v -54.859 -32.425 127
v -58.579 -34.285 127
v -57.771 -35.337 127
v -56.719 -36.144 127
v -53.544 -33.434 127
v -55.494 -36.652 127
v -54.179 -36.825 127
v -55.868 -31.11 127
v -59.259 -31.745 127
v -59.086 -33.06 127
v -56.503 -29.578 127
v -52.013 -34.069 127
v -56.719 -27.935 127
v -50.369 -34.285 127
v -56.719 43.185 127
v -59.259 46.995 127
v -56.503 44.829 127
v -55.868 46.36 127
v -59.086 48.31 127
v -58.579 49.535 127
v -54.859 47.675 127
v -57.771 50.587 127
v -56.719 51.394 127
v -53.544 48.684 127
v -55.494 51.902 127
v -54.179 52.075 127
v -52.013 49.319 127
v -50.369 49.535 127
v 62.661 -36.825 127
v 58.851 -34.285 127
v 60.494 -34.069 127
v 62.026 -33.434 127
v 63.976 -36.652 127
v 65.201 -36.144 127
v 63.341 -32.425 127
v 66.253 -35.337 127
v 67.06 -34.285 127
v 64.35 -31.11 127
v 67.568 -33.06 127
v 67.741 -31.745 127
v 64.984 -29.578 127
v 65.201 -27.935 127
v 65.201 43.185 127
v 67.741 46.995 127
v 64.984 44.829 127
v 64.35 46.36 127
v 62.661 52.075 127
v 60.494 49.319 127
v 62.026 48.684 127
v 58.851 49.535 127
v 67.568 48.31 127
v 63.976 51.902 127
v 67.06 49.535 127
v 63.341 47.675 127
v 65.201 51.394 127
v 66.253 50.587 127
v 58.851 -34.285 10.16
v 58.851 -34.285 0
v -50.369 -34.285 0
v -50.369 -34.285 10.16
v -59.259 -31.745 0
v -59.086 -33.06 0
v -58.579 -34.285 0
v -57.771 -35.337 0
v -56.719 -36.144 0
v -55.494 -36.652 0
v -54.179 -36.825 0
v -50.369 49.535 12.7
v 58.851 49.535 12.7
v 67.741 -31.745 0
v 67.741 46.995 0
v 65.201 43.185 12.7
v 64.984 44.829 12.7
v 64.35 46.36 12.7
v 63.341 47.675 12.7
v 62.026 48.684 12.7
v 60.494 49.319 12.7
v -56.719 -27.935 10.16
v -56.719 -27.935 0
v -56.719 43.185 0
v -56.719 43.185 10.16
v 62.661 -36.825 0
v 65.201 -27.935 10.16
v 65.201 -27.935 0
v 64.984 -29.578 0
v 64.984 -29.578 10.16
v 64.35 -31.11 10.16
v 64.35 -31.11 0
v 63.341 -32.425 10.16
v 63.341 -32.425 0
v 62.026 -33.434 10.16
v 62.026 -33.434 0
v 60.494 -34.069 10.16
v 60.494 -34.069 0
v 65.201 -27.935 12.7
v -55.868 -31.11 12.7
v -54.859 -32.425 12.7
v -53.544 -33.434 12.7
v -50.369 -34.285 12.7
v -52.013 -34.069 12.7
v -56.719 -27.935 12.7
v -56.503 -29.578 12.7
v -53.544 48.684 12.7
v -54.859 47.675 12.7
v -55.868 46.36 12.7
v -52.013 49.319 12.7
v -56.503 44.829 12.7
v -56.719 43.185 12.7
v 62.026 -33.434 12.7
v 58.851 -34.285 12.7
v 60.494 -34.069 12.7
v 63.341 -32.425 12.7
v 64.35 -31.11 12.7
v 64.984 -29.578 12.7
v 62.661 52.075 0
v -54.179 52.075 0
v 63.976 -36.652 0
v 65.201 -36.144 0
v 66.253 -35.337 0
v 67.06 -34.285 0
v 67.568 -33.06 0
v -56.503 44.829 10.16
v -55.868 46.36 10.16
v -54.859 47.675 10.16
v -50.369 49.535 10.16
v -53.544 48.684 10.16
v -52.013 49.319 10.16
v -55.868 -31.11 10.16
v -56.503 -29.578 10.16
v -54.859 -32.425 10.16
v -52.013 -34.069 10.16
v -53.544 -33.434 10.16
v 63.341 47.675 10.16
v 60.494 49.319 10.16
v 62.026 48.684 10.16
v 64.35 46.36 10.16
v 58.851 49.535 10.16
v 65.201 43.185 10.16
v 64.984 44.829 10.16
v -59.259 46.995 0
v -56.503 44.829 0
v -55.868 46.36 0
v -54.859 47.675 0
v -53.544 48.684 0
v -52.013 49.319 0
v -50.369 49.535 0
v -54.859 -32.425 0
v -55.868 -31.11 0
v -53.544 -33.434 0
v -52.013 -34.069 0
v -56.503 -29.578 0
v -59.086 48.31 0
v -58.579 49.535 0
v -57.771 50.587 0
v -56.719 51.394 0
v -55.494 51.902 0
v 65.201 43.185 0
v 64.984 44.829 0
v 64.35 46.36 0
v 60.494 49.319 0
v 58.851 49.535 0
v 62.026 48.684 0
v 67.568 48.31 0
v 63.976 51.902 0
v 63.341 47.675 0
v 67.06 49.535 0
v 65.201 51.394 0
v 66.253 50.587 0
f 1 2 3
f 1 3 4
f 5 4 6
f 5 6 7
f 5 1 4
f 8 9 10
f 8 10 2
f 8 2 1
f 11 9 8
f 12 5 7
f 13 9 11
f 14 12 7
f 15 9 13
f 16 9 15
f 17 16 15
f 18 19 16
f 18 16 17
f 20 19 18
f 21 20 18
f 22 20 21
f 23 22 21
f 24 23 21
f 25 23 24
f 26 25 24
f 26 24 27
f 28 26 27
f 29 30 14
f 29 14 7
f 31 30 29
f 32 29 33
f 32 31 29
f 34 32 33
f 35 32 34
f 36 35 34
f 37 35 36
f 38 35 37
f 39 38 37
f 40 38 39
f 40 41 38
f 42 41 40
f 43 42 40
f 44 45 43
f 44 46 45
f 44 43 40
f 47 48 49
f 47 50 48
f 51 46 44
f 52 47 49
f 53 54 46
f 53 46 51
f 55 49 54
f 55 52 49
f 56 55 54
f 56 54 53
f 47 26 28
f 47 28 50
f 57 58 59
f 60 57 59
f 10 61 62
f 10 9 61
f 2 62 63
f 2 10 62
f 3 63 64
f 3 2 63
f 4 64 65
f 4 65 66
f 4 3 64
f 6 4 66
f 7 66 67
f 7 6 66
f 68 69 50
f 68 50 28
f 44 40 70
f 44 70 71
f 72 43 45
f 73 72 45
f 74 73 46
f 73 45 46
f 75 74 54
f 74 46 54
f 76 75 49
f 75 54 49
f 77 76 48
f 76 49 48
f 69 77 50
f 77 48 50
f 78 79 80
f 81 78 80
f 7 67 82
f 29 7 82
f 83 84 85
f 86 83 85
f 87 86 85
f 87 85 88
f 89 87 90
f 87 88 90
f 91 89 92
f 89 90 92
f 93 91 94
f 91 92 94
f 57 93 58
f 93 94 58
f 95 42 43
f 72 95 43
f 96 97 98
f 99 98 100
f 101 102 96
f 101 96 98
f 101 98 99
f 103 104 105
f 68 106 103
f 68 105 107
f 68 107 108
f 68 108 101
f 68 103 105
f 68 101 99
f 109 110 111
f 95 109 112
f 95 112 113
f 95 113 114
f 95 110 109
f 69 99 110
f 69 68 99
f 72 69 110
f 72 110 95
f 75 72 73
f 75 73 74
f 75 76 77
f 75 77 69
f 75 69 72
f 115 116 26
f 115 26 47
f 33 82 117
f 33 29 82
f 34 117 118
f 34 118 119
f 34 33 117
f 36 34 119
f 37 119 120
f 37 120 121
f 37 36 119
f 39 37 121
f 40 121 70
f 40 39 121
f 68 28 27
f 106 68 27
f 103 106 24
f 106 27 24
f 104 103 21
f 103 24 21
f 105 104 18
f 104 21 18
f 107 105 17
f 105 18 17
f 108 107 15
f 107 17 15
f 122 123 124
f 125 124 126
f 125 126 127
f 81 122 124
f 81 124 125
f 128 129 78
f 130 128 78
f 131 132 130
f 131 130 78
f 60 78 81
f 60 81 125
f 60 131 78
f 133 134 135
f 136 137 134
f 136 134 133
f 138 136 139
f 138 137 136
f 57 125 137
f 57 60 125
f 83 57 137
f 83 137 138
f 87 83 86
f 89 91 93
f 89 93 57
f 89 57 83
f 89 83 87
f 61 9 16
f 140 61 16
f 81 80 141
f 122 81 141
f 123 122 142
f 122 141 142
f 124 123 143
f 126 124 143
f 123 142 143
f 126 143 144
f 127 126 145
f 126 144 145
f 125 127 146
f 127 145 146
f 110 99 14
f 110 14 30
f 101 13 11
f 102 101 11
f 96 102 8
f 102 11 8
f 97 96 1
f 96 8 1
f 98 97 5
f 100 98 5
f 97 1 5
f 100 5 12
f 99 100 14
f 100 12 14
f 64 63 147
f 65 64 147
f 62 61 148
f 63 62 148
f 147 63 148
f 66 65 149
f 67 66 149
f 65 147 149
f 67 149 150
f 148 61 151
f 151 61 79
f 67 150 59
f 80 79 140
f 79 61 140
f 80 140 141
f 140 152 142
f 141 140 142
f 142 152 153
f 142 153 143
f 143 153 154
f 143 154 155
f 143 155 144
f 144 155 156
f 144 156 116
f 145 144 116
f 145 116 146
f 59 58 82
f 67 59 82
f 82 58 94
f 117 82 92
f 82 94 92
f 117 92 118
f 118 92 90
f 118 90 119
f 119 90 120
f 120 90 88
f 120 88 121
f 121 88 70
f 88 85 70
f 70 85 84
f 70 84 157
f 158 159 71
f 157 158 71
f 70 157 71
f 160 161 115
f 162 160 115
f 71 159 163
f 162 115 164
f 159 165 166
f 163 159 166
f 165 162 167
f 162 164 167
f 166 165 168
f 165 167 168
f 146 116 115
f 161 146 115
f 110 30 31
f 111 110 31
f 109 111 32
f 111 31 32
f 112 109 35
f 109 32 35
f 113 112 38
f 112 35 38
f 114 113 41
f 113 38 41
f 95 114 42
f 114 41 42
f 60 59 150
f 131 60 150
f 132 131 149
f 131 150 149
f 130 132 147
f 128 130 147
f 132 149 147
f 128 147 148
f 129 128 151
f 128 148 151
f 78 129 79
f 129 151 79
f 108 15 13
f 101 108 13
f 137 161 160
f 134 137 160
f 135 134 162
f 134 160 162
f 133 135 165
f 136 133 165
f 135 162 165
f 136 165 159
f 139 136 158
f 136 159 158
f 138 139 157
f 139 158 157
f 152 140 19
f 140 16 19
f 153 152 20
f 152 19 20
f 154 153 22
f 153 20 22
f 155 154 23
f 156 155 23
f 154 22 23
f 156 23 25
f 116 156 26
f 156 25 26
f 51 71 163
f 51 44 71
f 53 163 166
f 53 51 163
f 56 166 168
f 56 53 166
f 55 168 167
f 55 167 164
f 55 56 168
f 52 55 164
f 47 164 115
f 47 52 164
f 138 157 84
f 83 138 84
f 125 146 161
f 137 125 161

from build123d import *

# Parameters (mm, degrees)
F0_W     = 127
F0_H     = 88.9
F1_DEPTH = 127
F2_R     = 5.08
F4_DEPTH = 114.3
F6_DEPTH = 10.16


with BuildPart() as f1:
    # F0 (on Top) → F1 (new body)
    with BuildSketch(Plane.XY):
        with Locations((4.240815, 7.625027)):
            Rectangle(F0_W, F0_H)
    extrude(amount=F1_DEPTH)

    # F2
    f2_edges = [f1.edges().sort_by_distance(p)[0] for p in [
        (-59.259185, -36.824973, 63.5),
        (67.740815, -36.824973, 63.5),
        (67.740815, 52.075027, 63.5),
        (-59.259185, 52.075027, 63.5),
    ]]
    fillet(f2_edges, radius=F2_R)

    # F3 (on face) → F4 (cut)
    with BuildSketch(Plane.XY.offset(127)):
        with BuildLine():
            Line((58.850815, 49.535027), (-50.369185, 49.535027))
            ThreePointArc((-50.369185, 49.535027), (-54.859313, 47.675155), (-56.719185, 43.185027))
            Line((-56.719185, 43.185027), (-56.719185, -27.934973))
            ThreePointArc((-56.719185, -27.934973), (-54.859313, -32.425101), (-50.369185, -34.284973))
            Line((-50.369185, -34.284973), (58.850815, -34.284973))
            ThreePointArc((58.850815, -34.284973), (63.340943, -32.425101), (65.200815, -27.934973))
            Line((65.200815, -27.934973), (65.200815, 43.185027))
            ThreePointArc((65.200815, 43.185027), (63.340943, 47.675155), (58.850815, 49.535027))
        make_face()
    extrude(amount=-F4_DEPTH, mode=Mode.SUBTRACT)

    # F5 (on face) → F6 (cut)
    with BuildSketch(Plane(origin=(0, 0, 0), x_dir=(1, 0, 0), z_dir=(0, 0, -1))):
        with BuildLine():
            ThreePointArc((58.850815, -49.535027), (63.340943, -47.675155), (65.200815, -43.185027))
            Line((65.200815, -43.185027), (65.200815, 27.934973))
            ThreePointArc((65.200815, 27.934973), (63.340943, 32.425101), (58.850815, 34.284973))
            Line((58.850815, 34.284973), (-50.369185, 34.284973))
            ThreePointArc((-50.369185, 34.284973), (-54.859313, 32.425101), (-56.719185, 27.934973))
            Line((-56.719185, 27.934973), (-56.719185, -43.185027))
            ThreePointArc((-56.719185, -43.185027), (-54.859313, -47.675155), (-50.369185, -49.535027))
            Line((-50.369185, -49.535027), (58.850815, -49.535027))
        make_face()
    extrude(amount=-F6_DEPTH, mode=Mode.SUBTRACT)


solid = f1.part
